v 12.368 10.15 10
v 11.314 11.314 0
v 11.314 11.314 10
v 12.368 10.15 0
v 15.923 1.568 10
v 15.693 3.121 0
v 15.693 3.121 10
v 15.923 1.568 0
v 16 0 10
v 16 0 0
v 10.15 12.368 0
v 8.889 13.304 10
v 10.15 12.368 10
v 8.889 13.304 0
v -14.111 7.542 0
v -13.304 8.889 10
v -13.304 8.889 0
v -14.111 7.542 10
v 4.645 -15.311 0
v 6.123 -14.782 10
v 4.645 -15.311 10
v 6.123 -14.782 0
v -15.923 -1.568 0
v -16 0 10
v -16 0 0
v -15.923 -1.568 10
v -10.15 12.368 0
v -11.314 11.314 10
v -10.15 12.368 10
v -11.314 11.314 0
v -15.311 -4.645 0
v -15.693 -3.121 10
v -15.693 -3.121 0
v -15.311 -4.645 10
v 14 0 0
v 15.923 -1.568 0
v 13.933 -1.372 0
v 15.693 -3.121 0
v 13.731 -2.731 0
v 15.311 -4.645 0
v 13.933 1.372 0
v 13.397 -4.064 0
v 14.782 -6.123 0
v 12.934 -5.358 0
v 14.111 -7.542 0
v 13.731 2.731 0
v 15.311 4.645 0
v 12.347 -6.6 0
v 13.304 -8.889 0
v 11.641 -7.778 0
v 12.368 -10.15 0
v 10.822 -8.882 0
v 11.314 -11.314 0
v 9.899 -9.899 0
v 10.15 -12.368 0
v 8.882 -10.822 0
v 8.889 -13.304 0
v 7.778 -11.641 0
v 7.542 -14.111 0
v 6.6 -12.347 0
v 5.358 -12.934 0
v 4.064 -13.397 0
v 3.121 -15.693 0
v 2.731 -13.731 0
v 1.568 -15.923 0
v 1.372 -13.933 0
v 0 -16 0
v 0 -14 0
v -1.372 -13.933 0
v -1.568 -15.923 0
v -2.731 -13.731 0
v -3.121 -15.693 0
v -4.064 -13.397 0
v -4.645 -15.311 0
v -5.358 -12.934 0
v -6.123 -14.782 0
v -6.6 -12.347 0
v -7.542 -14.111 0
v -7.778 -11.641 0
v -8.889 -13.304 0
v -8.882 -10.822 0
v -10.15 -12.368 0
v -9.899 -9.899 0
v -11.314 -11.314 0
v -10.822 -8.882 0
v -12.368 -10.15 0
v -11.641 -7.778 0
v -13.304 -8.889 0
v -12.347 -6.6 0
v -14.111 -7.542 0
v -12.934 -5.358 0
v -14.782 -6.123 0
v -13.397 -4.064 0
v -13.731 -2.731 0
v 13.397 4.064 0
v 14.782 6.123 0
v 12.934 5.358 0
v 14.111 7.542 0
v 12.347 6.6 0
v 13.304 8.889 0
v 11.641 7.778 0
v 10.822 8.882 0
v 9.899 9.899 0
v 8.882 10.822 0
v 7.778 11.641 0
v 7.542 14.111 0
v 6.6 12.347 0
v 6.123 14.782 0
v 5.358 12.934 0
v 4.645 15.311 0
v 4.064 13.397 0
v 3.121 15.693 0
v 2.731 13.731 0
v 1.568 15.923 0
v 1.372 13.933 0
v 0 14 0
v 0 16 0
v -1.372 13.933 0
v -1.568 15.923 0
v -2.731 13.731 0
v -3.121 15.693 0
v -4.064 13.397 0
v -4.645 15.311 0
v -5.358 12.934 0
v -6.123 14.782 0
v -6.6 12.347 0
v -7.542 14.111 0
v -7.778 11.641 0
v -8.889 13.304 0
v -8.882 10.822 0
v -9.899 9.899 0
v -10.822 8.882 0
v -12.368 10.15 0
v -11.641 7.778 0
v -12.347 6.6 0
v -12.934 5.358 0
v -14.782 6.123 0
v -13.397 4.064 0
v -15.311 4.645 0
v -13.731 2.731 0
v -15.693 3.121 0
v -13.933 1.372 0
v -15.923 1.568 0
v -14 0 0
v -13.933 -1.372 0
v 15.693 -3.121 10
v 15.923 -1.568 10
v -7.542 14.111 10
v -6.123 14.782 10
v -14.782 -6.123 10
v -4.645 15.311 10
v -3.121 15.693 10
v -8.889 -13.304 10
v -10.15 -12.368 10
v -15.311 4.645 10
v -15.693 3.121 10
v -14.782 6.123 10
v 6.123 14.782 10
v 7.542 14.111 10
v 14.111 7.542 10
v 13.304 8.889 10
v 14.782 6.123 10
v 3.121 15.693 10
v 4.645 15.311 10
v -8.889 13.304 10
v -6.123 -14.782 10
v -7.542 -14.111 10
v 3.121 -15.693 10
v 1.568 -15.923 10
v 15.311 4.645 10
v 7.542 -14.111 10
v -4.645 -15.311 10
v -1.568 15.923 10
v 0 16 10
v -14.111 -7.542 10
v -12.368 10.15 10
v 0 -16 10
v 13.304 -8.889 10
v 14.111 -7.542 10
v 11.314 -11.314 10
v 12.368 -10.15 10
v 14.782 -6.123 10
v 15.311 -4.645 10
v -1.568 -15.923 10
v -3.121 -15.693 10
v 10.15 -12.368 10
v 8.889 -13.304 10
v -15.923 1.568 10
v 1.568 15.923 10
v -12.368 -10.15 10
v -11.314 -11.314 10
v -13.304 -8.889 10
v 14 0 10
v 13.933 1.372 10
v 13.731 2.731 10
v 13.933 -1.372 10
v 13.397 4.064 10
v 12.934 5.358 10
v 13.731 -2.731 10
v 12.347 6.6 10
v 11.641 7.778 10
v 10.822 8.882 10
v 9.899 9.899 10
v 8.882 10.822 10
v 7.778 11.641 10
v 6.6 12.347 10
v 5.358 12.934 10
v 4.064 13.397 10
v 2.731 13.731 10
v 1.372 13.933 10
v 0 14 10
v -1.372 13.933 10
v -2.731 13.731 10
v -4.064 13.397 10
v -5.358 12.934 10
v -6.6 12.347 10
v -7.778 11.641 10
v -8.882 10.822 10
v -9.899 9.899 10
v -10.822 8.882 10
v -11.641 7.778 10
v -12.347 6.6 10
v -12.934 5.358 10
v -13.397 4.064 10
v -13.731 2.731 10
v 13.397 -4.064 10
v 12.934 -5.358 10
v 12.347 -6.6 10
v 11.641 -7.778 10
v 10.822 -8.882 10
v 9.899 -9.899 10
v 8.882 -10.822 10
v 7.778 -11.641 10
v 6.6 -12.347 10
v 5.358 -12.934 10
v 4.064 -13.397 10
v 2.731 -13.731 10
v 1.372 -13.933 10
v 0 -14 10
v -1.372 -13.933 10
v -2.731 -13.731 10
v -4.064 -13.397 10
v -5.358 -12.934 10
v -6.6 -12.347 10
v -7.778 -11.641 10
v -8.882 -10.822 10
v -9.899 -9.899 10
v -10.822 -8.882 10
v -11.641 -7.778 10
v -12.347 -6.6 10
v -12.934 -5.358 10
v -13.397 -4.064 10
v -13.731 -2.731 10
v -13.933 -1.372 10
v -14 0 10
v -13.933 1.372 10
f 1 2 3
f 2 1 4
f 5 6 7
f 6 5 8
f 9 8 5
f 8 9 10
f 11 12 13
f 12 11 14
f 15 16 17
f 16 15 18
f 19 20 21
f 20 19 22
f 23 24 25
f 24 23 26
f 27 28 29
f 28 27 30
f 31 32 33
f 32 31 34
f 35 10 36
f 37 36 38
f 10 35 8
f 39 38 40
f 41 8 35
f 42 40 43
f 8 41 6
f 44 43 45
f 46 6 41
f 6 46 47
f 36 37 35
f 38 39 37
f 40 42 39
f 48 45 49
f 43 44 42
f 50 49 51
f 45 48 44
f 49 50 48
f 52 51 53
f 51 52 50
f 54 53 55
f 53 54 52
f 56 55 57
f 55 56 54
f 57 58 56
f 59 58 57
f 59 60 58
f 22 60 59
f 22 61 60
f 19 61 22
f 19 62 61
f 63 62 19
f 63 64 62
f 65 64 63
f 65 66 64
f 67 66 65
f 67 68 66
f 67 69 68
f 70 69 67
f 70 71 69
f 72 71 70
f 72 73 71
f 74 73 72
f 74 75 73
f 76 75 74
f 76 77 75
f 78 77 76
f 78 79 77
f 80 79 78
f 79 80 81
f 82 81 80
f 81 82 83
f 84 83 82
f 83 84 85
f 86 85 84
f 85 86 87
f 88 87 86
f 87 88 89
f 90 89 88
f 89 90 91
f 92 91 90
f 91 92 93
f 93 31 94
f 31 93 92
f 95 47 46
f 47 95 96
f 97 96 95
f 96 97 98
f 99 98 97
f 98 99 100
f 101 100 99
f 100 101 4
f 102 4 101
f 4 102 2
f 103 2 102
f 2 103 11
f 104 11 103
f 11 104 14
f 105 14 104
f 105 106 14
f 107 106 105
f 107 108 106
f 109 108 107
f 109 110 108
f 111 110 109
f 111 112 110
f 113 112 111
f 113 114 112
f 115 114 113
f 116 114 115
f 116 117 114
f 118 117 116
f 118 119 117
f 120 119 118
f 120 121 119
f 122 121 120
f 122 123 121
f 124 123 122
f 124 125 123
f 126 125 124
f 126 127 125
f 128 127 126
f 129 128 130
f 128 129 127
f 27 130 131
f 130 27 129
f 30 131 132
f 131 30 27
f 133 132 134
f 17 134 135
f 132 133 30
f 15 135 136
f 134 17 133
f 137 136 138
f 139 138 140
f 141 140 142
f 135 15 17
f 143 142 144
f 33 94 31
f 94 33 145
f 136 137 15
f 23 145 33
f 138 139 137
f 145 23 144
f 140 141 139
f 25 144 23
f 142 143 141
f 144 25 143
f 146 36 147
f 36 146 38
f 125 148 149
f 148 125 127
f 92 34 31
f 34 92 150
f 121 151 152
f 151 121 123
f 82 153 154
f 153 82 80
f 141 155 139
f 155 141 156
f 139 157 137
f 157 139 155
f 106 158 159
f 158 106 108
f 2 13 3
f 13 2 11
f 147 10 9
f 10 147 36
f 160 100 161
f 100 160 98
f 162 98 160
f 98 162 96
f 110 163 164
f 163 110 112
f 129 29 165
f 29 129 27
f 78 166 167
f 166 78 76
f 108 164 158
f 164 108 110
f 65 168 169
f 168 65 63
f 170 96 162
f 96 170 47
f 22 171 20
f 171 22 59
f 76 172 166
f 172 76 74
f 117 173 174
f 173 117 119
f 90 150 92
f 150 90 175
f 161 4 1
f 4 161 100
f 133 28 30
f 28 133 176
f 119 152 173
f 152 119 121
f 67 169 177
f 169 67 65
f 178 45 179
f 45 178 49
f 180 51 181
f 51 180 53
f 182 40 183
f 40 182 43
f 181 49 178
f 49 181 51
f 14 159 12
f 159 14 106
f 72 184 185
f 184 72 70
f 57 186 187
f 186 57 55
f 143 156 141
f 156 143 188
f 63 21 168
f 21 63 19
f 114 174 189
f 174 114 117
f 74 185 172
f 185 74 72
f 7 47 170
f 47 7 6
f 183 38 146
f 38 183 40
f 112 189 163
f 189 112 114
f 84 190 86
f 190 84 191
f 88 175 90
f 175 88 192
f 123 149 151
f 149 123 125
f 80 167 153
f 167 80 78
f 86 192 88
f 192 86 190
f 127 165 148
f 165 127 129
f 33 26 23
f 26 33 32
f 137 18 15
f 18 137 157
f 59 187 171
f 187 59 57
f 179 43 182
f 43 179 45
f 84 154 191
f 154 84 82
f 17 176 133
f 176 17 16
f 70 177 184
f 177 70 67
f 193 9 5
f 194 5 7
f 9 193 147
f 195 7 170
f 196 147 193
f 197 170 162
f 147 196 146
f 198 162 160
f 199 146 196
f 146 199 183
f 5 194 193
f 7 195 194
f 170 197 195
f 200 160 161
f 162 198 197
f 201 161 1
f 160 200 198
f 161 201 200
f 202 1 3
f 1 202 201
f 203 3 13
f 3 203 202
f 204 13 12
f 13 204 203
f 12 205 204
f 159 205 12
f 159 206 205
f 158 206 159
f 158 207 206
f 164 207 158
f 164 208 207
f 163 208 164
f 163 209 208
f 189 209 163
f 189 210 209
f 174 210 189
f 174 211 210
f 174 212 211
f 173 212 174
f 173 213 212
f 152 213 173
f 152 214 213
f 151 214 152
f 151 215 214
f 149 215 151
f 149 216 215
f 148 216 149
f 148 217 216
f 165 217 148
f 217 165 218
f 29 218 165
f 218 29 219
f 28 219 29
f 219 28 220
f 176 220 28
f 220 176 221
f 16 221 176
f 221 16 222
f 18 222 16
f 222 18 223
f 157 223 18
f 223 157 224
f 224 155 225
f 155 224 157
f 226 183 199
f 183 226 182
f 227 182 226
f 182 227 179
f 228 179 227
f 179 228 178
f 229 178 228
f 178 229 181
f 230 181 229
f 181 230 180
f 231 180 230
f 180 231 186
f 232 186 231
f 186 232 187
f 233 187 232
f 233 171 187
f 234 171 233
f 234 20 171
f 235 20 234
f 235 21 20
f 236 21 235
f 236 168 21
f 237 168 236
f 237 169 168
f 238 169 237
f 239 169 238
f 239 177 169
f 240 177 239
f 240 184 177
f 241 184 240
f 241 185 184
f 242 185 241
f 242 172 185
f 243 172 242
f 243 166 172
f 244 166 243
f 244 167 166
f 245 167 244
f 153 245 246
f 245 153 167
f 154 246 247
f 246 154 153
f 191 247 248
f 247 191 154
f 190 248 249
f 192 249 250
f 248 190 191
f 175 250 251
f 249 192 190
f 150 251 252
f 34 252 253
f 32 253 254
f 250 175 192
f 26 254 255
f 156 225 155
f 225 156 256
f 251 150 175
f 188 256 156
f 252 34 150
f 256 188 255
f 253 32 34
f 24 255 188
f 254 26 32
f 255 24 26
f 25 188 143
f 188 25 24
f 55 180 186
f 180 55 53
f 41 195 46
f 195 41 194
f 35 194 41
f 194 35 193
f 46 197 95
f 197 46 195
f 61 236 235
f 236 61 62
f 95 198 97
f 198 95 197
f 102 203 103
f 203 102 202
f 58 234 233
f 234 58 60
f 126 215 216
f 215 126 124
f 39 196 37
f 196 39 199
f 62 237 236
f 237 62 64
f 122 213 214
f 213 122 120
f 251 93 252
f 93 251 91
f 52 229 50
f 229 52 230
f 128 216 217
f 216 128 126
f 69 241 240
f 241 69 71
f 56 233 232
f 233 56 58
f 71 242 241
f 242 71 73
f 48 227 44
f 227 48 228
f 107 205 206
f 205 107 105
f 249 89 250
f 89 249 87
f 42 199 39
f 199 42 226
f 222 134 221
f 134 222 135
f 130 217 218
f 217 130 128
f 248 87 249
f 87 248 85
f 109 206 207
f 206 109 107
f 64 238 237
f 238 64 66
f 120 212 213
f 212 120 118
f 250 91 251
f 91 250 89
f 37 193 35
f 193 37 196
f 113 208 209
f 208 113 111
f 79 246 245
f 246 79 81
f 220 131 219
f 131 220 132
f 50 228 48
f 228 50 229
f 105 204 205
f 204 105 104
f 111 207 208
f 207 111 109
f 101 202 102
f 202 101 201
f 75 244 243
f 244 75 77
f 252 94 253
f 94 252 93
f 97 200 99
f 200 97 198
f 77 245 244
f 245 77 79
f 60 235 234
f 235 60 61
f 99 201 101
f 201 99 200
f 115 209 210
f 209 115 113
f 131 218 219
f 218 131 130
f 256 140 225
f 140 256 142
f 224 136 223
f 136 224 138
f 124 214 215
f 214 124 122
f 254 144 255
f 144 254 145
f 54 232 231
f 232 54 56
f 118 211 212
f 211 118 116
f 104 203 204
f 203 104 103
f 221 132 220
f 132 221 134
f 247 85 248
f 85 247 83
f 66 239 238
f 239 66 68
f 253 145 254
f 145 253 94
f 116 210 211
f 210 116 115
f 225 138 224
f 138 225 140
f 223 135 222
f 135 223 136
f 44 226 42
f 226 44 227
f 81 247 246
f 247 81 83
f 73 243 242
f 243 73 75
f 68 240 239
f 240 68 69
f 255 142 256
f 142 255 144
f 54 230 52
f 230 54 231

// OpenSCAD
module ht32_cap() {
    difference() {
        // Outer cap
        cylinder(h=10, r1=16, r2=16, $fn=64);
        // Inner hollow part
        translate([0, 0, -1])
            cylinder(h=11, r1=14, r2=14, $fn=64);
    }
}

ht32_cap();
